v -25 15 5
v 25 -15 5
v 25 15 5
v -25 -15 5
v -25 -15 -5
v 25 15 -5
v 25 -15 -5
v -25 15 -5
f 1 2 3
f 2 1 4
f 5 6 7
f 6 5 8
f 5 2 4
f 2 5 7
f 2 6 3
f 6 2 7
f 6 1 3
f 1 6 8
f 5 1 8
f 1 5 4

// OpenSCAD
// Parameters
body_length = 50; //[25:100:1]
body_width = 30; //[15:60:1]
body_height = 10; //[5:20:1]

// Main Body Module
module main_body() {
  color([0.85, 0.85, 0.8]) // Off-white for 3D printed PLA
  translate([0, 0, 0]) // Centered at origin
    cube([body_length, body_width, body_height], center=true);
}

// Final Model
union() {
  main_body();
}
